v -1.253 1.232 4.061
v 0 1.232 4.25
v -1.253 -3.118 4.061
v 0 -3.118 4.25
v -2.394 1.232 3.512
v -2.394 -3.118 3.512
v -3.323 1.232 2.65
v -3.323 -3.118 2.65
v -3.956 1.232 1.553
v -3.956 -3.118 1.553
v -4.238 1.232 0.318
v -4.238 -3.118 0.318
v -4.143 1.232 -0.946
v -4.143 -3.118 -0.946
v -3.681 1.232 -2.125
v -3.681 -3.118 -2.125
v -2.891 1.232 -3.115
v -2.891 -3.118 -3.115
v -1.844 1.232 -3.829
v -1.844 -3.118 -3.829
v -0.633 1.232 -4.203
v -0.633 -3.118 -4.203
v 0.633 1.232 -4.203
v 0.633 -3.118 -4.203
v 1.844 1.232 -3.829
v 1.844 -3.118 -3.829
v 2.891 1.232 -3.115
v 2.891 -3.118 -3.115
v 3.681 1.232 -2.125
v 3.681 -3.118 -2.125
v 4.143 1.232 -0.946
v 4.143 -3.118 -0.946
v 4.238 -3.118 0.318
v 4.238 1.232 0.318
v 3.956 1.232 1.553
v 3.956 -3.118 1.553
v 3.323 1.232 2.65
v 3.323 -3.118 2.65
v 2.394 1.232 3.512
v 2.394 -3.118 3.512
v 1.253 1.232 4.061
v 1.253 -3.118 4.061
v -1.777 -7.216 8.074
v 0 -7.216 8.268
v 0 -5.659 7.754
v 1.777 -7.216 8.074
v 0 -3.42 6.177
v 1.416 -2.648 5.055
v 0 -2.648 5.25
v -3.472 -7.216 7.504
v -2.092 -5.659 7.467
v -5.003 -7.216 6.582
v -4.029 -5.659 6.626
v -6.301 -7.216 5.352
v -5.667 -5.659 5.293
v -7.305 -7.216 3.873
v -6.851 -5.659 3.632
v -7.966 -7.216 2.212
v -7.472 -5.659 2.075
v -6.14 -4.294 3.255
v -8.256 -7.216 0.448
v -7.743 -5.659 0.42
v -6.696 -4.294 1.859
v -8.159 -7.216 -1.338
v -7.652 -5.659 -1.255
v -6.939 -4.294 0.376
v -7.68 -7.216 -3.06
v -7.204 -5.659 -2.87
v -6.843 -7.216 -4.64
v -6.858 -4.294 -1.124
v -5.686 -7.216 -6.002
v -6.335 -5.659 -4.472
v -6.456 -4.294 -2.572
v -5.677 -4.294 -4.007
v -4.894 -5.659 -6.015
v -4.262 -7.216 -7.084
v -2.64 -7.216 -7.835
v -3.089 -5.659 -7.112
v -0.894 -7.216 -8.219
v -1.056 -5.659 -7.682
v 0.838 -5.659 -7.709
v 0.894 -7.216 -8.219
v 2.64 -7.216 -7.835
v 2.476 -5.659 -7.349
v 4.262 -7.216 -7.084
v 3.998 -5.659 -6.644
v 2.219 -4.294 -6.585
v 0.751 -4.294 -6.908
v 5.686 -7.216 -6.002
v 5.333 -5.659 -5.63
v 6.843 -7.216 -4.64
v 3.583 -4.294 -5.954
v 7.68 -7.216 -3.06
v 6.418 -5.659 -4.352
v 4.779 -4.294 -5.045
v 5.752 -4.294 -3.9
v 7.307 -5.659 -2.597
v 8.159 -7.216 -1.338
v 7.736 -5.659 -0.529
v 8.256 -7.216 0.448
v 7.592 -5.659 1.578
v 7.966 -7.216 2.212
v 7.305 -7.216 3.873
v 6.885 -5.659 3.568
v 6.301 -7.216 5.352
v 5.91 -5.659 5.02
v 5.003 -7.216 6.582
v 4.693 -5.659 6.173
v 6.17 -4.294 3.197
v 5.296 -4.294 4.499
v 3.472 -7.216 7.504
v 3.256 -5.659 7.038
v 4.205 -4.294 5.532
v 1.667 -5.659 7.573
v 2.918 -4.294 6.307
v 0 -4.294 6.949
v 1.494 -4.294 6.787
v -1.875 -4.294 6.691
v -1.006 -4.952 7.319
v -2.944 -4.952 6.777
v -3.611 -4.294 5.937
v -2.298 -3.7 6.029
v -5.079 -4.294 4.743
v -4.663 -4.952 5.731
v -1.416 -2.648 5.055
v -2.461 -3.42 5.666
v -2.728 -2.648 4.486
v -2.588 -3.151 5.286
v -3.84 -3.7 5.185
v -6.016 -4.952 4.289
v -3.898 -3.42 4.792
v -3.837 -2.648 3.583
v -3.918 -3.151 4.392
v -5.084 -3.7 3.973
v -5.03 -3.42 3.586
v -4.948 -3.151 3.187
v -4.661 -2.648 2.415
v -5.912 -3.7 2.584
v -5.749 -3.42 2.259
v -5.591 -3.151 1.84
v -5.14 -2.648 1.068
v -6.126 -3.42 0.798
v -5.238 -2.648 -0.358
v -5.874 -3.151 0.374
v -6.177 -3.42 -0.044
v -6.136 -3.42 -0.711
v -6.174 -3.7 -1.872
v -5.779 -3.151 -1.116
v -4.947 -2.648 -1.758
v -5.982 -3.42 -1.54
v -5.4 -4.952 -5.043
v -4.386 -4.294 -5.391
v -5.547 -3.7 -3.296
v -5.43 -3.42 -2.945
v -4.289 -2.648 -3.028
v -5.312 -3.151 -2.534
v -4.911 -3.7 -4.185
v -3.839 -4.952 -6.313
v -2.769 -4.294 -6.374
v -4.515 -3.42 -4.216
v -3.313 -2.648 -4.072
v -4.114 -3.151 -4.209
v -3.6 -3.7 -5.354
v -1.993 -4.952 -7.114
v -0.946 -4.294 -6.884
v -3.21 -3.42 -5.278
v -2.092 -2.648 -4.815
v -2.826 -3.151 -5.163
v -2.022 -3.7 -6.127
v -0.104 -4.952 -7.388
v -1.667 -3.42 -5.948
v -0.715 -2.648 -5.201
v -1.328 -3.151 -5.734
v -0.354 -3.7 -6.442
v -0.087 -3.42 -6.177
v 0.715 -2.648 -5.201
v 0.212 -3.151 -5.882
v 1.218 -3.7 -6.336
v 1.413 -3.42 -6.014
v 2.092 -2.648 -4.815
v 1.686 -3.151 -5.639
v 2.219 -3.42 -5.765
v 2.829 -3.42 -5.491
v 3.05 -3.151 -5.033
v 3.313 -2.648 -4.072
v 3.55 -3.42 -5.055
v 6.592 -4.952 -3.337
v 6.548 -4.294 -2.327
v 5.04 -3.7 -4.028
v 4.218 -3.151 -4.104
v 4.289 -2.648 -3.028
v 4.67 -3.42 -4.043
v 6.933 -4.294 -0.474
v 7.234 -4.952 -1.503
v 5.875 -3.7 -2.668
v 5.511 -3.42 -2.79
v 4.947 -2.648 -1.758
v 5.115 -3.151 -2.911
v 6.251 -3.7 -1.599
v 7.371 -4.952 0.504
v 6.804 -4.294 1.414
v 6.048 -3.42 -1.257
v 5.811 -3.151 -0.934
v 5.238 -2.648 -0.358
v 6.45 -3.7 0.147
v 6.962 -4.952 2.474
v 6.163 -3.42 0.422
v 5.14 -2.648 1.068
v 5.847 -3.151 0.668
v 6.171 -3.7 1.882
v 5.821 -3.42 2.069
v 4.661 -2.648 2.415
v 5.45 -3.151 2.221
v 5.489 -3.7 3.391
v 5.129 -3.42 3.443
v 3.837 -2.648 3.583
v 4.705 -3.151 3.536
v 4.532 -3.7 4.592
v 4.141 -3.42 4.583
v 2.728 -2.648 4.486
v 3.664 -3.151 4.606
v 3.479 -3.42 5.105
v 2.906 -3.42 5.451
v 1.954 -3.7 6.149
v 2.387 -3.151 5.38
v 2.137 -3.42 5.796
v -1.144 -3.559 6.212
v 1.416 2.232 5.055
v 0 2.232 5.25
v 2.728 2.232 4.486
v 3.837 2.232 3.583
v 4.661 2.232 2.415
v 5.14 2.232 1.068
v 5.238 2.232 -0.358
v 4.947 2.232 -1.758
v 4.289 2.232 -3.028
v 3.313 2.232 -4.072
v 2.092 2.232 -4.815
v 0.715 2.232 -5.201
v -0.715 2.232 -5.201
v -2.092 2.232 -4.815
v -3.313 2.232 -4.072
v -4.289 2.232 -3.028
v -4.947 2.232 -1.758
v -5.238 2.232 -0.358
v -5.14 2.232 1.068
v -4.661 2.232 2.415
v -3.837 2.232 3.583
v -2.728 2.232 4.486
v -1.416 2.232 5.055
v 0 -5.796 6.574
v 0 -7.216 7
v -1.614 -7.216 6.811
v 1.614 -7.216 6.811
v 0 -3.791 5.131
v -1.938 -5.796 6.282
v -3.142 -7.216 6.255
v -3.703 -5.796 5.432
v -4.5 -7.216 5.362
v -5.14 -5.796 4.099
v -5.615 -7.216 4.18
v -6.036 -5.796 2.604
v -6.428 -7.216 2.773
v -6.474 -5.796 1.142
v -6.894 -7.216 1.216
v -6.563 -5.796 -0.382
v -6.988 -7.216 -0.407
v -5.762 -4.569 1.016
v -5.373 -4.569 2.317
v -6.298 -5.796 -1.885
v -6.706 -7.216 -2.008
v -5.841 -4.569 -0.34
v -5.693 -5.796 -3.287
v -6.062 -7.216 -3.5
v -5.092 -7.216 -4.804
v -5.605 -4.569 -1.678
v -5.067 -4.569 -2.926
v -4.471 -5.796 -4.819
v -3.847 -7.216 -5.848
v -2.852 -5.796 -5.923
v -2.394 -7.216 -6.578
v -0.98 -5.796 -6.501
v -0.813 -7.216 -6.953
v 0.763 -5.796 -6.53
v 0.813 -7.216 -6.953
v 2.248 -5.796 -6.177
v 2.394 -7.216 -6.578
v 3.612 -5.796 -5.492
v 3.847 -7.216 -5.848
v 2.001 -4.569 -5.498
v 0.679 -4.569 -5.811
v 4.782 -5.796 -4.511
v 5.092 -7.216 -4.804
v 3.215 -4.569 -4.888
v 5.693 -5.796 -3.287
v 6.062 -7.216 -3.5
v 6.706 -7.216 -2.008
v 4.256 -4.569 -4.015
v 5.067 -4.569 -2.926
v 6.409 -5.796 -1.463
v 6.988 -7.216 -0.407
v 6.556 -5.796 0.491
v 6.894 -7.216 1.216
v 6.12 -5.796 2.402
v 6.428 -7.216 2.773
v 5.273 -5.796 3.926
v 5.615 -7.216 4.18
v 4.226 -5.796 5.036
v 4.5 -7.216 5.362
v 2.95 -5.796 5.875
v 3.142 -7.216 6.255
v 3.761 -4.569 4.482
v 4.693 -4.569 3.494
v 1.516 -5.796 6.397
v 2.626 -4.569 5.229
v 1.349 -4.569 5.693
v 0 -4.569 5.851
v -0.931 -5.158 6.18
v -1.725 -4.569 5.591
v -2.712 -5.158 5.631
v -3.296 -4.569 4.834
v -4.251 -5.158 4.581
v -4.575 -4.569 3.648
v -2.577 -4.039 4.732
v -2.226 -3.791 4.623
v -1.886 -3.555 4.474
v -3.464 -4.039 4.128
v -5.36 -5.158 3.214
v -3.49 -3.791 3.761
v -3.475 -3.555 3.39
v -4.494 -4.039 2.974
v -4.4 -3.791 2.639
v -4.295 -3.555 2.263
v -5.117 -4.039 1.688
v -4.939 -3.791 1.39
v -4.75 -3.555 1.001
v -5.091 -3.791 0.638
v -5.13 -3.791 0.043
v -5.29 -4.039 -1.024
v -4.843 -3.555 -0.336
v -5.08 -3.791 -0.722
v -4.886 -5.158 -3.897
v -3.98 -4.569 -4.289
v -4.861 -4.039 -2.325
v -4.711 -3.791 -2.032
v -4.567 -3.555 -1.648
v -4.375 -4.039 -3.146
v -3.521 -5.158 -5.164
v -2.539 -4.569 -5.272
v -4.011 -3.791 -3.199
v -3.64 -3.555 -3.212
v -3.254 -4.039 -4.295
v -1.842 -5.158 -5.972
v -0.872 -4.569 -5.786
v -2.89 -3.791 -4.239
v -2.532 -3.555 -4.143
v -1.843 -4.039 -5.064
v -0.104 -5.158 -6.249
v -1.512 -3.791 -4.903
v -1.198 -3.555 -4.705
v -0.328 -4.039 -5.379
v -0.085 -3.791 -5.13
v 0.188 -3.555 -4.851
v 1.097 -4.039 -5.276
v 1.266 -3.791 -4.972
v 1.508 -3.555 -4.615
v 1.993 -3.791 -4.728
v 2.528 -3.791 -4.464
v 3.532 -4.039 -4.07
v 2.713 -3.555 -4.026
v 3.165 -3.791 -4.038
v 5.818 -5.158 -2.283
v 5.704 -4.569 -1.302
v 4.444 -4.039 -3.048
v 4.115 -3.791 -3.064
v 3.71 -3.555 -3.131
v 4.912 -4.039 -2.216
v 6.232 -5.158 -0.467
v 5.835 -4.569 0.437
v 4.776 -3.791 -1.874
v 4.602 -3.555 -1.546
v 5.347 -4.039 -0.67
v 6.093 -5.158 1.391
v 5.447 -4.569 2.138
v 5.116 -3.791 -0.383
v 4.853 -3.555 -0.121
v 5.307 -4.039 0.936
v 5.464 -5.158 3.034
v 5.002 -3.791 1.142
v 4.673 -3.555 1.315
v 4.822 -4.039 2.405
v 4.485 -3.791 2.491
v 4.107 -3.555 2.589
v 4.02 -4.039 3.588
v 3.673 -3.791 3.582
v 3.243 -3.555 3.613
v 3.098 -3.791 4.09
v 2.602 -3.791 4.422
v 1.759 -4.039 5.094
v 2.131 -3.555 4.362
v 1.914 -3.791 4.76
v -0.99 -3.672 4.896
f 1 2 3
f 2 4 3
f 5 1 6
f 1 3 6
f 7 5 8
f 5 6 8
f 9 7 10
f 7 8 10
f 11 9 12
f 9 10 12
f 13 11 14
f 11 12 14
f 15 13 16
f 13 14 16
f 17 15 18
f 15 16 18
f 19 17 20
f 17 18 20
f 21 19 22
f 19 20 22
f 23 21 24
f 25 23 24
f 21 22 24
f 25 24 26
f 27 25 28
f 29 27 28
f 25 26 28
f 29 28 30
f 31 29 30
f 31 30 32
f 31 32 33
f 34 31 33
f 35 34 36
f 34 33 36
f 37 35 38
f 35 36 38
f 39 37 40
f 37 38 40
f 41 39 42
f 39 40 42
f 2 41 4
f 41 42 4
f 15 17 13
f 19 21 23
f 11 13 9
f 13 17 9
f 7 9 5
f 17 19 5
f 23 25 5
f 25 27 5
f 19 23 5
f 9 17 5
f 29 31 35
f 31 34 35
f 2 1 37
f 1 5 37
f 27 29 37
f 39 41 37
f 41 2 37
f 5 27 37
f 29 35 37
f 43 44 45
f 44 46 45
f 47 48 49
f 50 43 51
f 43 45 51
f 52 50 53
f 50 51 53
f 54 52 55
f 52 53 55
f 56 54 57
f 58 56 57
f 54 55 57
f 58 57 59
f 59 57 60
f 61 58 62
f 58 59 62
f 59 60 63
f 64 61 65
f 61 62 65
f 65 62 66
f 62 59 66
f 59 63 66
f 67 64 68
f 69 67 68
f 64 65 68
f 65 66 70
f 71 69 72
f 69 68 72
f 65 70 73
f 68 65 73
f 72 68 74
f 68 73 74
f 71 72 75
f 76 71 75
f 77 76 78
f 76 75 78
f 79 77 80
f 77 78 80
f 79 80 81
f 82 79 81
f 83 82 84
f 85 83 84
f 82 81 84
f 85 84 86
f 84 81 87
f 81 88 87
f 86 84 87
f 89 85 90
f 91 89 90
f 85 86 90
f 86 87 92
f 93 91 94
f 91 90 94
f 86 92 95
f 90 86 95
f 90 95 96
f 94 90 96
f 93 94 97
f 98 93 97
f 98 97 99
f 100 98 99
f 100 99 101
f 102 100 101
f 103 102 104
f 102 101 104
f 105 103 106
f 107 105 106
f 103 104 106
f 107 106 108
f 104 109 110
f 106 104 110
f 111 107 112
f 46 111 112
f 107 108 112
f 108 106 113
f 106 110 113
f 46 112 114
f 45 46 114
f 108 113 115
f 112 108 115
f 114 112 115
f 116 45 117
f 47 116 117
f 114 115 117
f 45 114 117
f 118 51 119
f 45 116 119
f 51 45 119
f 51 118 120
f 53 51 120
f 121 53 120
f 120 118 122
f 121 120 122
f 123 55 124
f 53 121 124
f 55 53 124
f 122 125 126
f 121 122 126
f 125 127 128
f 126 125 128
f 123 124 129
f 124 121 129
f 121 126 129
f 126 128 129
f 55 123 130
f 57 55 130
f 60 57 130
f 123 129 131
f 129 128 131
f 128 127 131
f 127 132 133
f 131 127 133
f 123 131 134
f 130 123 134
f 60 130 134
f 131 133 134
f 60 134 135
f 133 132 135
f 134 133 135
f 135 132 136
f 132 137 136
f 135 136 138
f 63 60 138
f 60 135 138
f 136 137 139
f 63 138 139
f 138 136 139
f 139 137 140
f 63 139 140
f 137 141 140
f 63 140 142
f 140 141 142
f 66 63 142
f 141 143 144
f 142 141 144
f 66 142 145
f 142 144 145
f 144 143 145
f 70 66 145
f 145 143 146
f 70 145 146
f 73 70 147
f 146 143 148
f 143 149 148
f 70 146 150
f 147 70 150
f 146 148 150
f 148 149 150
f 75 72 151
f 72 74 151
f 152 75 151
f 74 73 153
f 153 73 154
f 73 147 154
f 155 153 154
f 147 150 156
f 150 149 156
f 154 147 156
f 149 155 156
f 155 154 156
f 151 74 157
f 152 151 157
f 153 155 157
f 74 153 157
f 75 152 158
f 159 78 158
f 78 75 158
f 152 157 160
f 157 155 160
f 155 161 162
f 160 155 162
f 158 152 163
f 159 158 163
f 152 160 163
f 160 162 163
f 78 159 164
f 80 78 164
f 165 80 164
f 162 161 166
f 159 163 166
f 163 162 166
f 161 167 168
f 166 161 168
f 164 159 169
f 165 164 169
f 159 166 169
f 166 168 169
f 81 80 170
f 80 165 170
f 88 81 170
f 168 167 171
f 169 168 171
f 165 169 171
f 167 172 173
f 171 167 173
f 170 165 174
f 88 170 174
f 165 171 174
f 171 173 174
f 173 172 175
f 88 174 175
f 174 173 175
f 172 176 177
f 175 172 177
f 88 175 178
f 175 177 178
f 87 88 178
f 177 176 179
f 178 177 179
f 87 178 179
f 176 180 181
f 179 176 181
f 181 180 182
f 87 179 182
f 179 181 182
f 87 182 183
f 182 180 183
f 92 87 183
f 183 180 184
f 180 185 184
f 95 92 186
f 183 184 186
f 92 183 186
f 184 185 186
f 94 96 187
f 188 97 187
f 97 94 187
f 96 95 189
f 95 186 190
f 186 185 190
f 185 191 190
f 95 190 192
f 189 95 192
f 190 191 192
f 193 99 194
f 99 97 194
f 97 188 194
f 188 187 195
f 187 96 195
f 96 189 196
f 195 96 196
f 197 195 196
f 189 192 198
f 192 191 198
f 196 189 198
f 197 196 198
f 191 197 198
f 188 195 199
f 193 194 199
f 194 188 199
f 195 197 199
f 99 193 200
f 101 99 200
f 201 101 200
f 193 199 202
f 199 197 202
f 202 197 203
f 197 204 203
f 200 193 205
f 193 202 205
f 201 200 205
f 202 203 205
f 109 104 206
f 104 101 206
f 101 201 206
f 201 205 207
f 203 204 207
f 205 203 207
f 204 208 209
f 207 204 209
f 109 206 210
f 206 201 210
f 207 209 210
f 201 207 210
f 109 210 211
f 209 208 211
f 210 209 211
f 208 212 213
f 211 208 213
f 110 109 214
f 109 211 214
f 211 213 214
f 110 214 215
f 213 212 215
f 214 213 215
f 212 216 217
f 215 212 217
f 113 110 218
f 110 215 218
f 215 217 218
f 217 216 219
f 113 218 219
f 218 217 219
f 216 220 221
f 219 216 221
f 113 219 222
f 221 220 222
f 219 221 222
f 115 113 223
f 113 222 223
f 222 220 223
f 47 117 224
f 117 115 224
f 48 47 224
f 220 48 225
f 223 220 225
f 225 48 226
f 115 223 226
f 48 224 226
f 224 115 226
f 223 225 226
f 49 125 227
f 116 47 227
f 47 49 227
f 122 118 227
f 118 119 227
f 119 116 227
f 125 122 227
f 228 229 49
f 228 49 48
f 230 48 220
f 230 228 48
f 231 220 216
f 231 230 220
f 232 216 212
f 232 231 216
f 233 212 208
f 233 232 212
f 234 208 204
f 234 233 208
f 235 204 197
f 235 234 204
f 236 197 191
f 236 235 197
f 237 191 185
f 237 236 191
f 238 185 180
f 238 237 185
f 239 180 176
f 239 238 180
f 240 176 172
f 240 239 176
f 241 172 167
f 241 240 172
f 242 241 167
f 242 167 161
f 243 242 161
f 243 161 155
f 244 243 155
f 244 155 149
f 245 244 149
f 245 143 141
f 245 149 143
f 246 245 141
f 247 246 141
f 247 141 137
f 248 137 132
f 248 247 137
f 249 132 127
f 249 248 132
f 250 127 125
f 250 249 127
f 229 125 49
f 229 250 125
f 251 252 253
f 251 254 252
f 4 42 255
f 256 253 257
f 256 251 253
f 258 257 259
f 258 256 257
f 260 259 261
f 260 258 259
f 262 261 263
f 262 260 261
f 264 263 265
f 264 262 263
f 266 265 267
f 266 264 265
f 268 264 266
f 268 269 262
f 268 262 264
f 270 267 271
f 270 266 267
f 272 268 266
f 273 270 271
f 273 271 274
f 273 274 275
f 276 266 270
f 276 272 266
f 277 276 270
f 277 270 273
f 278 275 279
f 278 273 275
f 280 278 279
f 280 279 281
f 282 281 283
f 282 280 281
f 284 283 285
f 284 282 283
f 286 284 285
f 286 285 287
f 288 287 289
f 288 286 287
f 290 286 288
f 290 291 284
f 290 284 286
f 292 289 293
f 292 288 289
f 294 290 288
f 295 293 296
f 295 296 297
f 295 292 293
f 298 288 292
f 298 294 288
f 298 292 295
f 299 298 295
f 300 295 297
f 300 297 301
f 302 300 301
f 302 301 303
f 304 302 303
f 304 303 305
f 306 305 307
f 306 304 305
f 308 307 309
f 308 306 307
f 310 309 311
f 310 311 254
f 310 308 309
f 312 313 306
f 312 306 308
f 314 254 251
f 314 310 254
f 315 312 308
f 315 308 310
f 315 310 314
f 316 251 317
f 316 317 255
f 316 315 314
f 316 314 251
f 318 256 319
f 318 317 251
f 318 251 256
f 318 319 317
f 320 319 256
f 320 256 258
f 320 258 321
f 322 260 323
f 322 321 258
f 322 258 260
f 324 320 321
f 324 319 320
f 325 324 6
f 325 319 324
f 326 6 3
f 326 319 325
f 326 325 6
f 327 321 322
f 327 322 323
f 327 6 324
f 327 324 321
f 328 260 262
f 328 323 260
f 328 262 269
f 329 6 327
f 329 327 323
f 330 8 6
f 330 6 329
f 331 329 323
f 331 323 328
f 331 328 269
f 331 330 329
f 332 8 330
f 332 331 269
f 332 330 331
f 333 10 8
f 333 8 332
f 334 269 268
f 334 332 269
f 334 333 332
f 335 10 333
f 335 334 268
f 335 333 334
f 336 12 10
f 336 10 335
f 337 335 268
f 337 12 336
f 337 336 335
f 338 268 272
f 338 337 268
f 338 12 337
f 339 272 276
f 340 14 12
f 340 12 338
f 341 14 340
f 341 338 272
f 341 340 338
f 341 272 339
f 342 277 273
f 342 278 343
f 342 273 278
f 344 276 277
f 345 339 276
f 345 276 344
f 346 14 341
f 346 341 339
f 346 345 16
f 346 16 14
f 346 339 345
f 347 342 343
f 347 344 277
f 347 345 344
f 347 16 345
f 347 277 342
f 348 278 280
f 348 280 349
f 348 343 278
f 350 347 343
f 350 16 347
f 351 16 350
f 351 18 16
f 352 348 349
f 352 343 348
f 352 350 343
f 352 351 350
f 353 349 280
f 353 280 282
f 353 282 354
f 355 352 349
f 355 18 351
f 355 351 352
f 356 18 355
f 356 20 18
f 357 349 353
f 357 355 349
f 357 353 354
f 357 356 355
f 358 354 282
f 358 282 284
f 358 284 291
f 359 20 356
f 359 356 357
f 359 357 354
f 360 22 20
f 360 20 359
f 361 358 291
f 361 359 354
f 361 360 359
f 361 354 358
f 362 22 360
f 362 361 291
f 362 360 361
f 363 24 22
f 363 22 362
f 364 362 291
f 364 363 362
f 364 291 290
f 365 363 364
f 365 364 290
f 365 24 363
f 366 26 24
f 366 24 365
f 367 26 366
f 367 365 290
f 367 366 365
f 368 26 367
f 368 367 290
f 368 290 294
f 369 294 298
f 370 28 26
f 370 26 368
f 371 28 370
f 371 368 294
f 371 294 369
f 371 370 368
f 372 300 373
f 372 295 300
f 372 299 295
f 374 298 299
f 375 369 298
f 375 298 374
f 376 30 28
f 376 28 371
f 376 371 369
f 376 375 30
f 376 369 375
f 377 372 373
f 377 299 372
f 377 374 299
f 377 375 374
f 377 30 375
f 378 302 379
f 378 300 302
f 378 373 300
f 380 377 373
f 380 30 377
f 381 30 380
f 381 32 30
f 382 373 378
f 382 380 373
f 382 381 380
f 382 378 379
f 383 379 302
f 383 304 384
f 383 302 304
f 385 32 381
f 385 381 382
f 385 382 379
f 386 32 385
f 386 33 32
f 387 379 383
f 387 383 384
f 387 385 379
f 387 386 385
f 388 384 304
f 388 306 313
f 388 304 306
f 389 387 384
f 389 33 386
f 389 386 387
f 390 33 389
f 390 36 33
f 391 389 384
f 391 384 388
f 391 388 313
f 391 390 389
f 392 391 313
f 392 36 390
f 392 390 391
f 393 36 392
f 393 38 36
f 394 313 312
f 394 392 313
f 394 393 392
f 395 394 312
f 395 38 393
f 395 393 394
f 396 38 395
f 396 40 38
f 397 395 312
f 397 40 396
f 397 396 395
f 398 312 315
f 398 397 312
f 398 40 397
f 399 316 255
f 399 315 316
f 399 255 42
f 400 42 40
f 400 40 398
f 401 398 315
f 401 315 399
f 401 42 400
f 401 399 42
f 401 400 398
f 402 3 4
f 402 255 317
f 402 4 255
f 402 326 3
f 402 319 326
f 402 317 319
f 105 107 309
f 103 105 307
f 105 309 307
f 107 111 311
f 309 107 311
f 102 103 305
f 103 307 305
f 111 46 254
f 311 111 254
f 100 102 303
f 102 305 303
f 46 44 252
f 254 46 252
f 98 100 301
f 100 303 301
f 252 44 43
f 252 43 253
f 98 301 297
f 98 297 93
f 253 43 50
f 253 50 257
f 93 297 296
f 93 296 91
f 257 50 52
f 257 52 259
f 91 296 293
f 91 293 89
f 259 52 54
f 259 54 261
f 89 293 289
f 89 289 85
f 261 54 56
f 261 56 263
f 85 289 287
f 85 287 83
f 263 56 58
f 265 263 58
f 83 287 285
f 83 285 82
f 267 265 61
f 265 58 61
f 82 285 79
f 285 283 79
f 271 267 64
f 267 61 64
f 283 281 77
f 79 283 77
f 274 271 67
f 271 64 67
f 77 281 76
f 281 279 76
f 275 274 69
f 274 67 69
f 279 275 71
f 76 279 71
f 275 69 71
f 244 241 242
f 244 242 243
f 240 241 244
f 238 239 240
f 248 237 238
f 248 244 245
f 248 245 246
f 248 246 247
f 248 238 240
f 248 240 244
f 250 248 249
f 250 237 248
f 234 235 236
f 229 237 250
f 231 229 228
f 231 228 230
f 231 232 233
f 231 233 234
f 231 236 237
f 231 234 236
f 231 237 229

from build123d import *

# Parameters (mm, degrees)
EXTRUDE_START   = 1
SKETCH_5_R      = 5.25
EXTRUDE_2_DEPTH = 1


with BuildPart() as part:
    # 草图4 → 旋转1 (revolve)
    with BuildSketch(Plane.XY, mode=Mode.PRIVATE) as revolve_1_sk:
        with BuildLine():
            Line((-5.25, 1.232083698), (-4.25, 1.232083698))
            Line((-4.25, 1.232083698), (-4.25, -3.117916302))
            add(Edge.make_bspline(
                [(-7, -7.215756799), (-6.518434103, -4.584722436), (-4.25, -3.117916302)],
                knots=[0, 0, 0, 1, 1, 1], degree=2))
            Line((-7, -7.215756799), (-8.267671788, -7.215756799))
            add(Edge.make_bspline(
                [(-8.267671788, -7.215756799), (-7.63264977, -4.356571521), (-5.25, -2.648159382)],
                knots=[0, 0, 0, 1, 1, 1], degree=2))
            Line((-5.25, -2.648159382), (-5.25, 1.232083698))
        make_face()
    revolve(revolve_1_sk.sketch.rotate(Axis((0, 0, 0), (0, -1, 0)), 270), axis=Axis((0, 0, 0), (0, -1, 0)))

    # 草图5 → 凸台-拉伸2 (add)
    with BuildSketch(Plane(origin=(0, 1.232083698, 0), x_dir=(1, 0, 0), z_dir=(0, 1, 0)).offset(EXTRUDE_START)):
        with Locations(Location((0, 0, 0), (0, 0, 270))):
            Circle(SKETCH_5_R)
    extrude(amount=-EXTRUDE_2_DEPTH)


solid = part.part
